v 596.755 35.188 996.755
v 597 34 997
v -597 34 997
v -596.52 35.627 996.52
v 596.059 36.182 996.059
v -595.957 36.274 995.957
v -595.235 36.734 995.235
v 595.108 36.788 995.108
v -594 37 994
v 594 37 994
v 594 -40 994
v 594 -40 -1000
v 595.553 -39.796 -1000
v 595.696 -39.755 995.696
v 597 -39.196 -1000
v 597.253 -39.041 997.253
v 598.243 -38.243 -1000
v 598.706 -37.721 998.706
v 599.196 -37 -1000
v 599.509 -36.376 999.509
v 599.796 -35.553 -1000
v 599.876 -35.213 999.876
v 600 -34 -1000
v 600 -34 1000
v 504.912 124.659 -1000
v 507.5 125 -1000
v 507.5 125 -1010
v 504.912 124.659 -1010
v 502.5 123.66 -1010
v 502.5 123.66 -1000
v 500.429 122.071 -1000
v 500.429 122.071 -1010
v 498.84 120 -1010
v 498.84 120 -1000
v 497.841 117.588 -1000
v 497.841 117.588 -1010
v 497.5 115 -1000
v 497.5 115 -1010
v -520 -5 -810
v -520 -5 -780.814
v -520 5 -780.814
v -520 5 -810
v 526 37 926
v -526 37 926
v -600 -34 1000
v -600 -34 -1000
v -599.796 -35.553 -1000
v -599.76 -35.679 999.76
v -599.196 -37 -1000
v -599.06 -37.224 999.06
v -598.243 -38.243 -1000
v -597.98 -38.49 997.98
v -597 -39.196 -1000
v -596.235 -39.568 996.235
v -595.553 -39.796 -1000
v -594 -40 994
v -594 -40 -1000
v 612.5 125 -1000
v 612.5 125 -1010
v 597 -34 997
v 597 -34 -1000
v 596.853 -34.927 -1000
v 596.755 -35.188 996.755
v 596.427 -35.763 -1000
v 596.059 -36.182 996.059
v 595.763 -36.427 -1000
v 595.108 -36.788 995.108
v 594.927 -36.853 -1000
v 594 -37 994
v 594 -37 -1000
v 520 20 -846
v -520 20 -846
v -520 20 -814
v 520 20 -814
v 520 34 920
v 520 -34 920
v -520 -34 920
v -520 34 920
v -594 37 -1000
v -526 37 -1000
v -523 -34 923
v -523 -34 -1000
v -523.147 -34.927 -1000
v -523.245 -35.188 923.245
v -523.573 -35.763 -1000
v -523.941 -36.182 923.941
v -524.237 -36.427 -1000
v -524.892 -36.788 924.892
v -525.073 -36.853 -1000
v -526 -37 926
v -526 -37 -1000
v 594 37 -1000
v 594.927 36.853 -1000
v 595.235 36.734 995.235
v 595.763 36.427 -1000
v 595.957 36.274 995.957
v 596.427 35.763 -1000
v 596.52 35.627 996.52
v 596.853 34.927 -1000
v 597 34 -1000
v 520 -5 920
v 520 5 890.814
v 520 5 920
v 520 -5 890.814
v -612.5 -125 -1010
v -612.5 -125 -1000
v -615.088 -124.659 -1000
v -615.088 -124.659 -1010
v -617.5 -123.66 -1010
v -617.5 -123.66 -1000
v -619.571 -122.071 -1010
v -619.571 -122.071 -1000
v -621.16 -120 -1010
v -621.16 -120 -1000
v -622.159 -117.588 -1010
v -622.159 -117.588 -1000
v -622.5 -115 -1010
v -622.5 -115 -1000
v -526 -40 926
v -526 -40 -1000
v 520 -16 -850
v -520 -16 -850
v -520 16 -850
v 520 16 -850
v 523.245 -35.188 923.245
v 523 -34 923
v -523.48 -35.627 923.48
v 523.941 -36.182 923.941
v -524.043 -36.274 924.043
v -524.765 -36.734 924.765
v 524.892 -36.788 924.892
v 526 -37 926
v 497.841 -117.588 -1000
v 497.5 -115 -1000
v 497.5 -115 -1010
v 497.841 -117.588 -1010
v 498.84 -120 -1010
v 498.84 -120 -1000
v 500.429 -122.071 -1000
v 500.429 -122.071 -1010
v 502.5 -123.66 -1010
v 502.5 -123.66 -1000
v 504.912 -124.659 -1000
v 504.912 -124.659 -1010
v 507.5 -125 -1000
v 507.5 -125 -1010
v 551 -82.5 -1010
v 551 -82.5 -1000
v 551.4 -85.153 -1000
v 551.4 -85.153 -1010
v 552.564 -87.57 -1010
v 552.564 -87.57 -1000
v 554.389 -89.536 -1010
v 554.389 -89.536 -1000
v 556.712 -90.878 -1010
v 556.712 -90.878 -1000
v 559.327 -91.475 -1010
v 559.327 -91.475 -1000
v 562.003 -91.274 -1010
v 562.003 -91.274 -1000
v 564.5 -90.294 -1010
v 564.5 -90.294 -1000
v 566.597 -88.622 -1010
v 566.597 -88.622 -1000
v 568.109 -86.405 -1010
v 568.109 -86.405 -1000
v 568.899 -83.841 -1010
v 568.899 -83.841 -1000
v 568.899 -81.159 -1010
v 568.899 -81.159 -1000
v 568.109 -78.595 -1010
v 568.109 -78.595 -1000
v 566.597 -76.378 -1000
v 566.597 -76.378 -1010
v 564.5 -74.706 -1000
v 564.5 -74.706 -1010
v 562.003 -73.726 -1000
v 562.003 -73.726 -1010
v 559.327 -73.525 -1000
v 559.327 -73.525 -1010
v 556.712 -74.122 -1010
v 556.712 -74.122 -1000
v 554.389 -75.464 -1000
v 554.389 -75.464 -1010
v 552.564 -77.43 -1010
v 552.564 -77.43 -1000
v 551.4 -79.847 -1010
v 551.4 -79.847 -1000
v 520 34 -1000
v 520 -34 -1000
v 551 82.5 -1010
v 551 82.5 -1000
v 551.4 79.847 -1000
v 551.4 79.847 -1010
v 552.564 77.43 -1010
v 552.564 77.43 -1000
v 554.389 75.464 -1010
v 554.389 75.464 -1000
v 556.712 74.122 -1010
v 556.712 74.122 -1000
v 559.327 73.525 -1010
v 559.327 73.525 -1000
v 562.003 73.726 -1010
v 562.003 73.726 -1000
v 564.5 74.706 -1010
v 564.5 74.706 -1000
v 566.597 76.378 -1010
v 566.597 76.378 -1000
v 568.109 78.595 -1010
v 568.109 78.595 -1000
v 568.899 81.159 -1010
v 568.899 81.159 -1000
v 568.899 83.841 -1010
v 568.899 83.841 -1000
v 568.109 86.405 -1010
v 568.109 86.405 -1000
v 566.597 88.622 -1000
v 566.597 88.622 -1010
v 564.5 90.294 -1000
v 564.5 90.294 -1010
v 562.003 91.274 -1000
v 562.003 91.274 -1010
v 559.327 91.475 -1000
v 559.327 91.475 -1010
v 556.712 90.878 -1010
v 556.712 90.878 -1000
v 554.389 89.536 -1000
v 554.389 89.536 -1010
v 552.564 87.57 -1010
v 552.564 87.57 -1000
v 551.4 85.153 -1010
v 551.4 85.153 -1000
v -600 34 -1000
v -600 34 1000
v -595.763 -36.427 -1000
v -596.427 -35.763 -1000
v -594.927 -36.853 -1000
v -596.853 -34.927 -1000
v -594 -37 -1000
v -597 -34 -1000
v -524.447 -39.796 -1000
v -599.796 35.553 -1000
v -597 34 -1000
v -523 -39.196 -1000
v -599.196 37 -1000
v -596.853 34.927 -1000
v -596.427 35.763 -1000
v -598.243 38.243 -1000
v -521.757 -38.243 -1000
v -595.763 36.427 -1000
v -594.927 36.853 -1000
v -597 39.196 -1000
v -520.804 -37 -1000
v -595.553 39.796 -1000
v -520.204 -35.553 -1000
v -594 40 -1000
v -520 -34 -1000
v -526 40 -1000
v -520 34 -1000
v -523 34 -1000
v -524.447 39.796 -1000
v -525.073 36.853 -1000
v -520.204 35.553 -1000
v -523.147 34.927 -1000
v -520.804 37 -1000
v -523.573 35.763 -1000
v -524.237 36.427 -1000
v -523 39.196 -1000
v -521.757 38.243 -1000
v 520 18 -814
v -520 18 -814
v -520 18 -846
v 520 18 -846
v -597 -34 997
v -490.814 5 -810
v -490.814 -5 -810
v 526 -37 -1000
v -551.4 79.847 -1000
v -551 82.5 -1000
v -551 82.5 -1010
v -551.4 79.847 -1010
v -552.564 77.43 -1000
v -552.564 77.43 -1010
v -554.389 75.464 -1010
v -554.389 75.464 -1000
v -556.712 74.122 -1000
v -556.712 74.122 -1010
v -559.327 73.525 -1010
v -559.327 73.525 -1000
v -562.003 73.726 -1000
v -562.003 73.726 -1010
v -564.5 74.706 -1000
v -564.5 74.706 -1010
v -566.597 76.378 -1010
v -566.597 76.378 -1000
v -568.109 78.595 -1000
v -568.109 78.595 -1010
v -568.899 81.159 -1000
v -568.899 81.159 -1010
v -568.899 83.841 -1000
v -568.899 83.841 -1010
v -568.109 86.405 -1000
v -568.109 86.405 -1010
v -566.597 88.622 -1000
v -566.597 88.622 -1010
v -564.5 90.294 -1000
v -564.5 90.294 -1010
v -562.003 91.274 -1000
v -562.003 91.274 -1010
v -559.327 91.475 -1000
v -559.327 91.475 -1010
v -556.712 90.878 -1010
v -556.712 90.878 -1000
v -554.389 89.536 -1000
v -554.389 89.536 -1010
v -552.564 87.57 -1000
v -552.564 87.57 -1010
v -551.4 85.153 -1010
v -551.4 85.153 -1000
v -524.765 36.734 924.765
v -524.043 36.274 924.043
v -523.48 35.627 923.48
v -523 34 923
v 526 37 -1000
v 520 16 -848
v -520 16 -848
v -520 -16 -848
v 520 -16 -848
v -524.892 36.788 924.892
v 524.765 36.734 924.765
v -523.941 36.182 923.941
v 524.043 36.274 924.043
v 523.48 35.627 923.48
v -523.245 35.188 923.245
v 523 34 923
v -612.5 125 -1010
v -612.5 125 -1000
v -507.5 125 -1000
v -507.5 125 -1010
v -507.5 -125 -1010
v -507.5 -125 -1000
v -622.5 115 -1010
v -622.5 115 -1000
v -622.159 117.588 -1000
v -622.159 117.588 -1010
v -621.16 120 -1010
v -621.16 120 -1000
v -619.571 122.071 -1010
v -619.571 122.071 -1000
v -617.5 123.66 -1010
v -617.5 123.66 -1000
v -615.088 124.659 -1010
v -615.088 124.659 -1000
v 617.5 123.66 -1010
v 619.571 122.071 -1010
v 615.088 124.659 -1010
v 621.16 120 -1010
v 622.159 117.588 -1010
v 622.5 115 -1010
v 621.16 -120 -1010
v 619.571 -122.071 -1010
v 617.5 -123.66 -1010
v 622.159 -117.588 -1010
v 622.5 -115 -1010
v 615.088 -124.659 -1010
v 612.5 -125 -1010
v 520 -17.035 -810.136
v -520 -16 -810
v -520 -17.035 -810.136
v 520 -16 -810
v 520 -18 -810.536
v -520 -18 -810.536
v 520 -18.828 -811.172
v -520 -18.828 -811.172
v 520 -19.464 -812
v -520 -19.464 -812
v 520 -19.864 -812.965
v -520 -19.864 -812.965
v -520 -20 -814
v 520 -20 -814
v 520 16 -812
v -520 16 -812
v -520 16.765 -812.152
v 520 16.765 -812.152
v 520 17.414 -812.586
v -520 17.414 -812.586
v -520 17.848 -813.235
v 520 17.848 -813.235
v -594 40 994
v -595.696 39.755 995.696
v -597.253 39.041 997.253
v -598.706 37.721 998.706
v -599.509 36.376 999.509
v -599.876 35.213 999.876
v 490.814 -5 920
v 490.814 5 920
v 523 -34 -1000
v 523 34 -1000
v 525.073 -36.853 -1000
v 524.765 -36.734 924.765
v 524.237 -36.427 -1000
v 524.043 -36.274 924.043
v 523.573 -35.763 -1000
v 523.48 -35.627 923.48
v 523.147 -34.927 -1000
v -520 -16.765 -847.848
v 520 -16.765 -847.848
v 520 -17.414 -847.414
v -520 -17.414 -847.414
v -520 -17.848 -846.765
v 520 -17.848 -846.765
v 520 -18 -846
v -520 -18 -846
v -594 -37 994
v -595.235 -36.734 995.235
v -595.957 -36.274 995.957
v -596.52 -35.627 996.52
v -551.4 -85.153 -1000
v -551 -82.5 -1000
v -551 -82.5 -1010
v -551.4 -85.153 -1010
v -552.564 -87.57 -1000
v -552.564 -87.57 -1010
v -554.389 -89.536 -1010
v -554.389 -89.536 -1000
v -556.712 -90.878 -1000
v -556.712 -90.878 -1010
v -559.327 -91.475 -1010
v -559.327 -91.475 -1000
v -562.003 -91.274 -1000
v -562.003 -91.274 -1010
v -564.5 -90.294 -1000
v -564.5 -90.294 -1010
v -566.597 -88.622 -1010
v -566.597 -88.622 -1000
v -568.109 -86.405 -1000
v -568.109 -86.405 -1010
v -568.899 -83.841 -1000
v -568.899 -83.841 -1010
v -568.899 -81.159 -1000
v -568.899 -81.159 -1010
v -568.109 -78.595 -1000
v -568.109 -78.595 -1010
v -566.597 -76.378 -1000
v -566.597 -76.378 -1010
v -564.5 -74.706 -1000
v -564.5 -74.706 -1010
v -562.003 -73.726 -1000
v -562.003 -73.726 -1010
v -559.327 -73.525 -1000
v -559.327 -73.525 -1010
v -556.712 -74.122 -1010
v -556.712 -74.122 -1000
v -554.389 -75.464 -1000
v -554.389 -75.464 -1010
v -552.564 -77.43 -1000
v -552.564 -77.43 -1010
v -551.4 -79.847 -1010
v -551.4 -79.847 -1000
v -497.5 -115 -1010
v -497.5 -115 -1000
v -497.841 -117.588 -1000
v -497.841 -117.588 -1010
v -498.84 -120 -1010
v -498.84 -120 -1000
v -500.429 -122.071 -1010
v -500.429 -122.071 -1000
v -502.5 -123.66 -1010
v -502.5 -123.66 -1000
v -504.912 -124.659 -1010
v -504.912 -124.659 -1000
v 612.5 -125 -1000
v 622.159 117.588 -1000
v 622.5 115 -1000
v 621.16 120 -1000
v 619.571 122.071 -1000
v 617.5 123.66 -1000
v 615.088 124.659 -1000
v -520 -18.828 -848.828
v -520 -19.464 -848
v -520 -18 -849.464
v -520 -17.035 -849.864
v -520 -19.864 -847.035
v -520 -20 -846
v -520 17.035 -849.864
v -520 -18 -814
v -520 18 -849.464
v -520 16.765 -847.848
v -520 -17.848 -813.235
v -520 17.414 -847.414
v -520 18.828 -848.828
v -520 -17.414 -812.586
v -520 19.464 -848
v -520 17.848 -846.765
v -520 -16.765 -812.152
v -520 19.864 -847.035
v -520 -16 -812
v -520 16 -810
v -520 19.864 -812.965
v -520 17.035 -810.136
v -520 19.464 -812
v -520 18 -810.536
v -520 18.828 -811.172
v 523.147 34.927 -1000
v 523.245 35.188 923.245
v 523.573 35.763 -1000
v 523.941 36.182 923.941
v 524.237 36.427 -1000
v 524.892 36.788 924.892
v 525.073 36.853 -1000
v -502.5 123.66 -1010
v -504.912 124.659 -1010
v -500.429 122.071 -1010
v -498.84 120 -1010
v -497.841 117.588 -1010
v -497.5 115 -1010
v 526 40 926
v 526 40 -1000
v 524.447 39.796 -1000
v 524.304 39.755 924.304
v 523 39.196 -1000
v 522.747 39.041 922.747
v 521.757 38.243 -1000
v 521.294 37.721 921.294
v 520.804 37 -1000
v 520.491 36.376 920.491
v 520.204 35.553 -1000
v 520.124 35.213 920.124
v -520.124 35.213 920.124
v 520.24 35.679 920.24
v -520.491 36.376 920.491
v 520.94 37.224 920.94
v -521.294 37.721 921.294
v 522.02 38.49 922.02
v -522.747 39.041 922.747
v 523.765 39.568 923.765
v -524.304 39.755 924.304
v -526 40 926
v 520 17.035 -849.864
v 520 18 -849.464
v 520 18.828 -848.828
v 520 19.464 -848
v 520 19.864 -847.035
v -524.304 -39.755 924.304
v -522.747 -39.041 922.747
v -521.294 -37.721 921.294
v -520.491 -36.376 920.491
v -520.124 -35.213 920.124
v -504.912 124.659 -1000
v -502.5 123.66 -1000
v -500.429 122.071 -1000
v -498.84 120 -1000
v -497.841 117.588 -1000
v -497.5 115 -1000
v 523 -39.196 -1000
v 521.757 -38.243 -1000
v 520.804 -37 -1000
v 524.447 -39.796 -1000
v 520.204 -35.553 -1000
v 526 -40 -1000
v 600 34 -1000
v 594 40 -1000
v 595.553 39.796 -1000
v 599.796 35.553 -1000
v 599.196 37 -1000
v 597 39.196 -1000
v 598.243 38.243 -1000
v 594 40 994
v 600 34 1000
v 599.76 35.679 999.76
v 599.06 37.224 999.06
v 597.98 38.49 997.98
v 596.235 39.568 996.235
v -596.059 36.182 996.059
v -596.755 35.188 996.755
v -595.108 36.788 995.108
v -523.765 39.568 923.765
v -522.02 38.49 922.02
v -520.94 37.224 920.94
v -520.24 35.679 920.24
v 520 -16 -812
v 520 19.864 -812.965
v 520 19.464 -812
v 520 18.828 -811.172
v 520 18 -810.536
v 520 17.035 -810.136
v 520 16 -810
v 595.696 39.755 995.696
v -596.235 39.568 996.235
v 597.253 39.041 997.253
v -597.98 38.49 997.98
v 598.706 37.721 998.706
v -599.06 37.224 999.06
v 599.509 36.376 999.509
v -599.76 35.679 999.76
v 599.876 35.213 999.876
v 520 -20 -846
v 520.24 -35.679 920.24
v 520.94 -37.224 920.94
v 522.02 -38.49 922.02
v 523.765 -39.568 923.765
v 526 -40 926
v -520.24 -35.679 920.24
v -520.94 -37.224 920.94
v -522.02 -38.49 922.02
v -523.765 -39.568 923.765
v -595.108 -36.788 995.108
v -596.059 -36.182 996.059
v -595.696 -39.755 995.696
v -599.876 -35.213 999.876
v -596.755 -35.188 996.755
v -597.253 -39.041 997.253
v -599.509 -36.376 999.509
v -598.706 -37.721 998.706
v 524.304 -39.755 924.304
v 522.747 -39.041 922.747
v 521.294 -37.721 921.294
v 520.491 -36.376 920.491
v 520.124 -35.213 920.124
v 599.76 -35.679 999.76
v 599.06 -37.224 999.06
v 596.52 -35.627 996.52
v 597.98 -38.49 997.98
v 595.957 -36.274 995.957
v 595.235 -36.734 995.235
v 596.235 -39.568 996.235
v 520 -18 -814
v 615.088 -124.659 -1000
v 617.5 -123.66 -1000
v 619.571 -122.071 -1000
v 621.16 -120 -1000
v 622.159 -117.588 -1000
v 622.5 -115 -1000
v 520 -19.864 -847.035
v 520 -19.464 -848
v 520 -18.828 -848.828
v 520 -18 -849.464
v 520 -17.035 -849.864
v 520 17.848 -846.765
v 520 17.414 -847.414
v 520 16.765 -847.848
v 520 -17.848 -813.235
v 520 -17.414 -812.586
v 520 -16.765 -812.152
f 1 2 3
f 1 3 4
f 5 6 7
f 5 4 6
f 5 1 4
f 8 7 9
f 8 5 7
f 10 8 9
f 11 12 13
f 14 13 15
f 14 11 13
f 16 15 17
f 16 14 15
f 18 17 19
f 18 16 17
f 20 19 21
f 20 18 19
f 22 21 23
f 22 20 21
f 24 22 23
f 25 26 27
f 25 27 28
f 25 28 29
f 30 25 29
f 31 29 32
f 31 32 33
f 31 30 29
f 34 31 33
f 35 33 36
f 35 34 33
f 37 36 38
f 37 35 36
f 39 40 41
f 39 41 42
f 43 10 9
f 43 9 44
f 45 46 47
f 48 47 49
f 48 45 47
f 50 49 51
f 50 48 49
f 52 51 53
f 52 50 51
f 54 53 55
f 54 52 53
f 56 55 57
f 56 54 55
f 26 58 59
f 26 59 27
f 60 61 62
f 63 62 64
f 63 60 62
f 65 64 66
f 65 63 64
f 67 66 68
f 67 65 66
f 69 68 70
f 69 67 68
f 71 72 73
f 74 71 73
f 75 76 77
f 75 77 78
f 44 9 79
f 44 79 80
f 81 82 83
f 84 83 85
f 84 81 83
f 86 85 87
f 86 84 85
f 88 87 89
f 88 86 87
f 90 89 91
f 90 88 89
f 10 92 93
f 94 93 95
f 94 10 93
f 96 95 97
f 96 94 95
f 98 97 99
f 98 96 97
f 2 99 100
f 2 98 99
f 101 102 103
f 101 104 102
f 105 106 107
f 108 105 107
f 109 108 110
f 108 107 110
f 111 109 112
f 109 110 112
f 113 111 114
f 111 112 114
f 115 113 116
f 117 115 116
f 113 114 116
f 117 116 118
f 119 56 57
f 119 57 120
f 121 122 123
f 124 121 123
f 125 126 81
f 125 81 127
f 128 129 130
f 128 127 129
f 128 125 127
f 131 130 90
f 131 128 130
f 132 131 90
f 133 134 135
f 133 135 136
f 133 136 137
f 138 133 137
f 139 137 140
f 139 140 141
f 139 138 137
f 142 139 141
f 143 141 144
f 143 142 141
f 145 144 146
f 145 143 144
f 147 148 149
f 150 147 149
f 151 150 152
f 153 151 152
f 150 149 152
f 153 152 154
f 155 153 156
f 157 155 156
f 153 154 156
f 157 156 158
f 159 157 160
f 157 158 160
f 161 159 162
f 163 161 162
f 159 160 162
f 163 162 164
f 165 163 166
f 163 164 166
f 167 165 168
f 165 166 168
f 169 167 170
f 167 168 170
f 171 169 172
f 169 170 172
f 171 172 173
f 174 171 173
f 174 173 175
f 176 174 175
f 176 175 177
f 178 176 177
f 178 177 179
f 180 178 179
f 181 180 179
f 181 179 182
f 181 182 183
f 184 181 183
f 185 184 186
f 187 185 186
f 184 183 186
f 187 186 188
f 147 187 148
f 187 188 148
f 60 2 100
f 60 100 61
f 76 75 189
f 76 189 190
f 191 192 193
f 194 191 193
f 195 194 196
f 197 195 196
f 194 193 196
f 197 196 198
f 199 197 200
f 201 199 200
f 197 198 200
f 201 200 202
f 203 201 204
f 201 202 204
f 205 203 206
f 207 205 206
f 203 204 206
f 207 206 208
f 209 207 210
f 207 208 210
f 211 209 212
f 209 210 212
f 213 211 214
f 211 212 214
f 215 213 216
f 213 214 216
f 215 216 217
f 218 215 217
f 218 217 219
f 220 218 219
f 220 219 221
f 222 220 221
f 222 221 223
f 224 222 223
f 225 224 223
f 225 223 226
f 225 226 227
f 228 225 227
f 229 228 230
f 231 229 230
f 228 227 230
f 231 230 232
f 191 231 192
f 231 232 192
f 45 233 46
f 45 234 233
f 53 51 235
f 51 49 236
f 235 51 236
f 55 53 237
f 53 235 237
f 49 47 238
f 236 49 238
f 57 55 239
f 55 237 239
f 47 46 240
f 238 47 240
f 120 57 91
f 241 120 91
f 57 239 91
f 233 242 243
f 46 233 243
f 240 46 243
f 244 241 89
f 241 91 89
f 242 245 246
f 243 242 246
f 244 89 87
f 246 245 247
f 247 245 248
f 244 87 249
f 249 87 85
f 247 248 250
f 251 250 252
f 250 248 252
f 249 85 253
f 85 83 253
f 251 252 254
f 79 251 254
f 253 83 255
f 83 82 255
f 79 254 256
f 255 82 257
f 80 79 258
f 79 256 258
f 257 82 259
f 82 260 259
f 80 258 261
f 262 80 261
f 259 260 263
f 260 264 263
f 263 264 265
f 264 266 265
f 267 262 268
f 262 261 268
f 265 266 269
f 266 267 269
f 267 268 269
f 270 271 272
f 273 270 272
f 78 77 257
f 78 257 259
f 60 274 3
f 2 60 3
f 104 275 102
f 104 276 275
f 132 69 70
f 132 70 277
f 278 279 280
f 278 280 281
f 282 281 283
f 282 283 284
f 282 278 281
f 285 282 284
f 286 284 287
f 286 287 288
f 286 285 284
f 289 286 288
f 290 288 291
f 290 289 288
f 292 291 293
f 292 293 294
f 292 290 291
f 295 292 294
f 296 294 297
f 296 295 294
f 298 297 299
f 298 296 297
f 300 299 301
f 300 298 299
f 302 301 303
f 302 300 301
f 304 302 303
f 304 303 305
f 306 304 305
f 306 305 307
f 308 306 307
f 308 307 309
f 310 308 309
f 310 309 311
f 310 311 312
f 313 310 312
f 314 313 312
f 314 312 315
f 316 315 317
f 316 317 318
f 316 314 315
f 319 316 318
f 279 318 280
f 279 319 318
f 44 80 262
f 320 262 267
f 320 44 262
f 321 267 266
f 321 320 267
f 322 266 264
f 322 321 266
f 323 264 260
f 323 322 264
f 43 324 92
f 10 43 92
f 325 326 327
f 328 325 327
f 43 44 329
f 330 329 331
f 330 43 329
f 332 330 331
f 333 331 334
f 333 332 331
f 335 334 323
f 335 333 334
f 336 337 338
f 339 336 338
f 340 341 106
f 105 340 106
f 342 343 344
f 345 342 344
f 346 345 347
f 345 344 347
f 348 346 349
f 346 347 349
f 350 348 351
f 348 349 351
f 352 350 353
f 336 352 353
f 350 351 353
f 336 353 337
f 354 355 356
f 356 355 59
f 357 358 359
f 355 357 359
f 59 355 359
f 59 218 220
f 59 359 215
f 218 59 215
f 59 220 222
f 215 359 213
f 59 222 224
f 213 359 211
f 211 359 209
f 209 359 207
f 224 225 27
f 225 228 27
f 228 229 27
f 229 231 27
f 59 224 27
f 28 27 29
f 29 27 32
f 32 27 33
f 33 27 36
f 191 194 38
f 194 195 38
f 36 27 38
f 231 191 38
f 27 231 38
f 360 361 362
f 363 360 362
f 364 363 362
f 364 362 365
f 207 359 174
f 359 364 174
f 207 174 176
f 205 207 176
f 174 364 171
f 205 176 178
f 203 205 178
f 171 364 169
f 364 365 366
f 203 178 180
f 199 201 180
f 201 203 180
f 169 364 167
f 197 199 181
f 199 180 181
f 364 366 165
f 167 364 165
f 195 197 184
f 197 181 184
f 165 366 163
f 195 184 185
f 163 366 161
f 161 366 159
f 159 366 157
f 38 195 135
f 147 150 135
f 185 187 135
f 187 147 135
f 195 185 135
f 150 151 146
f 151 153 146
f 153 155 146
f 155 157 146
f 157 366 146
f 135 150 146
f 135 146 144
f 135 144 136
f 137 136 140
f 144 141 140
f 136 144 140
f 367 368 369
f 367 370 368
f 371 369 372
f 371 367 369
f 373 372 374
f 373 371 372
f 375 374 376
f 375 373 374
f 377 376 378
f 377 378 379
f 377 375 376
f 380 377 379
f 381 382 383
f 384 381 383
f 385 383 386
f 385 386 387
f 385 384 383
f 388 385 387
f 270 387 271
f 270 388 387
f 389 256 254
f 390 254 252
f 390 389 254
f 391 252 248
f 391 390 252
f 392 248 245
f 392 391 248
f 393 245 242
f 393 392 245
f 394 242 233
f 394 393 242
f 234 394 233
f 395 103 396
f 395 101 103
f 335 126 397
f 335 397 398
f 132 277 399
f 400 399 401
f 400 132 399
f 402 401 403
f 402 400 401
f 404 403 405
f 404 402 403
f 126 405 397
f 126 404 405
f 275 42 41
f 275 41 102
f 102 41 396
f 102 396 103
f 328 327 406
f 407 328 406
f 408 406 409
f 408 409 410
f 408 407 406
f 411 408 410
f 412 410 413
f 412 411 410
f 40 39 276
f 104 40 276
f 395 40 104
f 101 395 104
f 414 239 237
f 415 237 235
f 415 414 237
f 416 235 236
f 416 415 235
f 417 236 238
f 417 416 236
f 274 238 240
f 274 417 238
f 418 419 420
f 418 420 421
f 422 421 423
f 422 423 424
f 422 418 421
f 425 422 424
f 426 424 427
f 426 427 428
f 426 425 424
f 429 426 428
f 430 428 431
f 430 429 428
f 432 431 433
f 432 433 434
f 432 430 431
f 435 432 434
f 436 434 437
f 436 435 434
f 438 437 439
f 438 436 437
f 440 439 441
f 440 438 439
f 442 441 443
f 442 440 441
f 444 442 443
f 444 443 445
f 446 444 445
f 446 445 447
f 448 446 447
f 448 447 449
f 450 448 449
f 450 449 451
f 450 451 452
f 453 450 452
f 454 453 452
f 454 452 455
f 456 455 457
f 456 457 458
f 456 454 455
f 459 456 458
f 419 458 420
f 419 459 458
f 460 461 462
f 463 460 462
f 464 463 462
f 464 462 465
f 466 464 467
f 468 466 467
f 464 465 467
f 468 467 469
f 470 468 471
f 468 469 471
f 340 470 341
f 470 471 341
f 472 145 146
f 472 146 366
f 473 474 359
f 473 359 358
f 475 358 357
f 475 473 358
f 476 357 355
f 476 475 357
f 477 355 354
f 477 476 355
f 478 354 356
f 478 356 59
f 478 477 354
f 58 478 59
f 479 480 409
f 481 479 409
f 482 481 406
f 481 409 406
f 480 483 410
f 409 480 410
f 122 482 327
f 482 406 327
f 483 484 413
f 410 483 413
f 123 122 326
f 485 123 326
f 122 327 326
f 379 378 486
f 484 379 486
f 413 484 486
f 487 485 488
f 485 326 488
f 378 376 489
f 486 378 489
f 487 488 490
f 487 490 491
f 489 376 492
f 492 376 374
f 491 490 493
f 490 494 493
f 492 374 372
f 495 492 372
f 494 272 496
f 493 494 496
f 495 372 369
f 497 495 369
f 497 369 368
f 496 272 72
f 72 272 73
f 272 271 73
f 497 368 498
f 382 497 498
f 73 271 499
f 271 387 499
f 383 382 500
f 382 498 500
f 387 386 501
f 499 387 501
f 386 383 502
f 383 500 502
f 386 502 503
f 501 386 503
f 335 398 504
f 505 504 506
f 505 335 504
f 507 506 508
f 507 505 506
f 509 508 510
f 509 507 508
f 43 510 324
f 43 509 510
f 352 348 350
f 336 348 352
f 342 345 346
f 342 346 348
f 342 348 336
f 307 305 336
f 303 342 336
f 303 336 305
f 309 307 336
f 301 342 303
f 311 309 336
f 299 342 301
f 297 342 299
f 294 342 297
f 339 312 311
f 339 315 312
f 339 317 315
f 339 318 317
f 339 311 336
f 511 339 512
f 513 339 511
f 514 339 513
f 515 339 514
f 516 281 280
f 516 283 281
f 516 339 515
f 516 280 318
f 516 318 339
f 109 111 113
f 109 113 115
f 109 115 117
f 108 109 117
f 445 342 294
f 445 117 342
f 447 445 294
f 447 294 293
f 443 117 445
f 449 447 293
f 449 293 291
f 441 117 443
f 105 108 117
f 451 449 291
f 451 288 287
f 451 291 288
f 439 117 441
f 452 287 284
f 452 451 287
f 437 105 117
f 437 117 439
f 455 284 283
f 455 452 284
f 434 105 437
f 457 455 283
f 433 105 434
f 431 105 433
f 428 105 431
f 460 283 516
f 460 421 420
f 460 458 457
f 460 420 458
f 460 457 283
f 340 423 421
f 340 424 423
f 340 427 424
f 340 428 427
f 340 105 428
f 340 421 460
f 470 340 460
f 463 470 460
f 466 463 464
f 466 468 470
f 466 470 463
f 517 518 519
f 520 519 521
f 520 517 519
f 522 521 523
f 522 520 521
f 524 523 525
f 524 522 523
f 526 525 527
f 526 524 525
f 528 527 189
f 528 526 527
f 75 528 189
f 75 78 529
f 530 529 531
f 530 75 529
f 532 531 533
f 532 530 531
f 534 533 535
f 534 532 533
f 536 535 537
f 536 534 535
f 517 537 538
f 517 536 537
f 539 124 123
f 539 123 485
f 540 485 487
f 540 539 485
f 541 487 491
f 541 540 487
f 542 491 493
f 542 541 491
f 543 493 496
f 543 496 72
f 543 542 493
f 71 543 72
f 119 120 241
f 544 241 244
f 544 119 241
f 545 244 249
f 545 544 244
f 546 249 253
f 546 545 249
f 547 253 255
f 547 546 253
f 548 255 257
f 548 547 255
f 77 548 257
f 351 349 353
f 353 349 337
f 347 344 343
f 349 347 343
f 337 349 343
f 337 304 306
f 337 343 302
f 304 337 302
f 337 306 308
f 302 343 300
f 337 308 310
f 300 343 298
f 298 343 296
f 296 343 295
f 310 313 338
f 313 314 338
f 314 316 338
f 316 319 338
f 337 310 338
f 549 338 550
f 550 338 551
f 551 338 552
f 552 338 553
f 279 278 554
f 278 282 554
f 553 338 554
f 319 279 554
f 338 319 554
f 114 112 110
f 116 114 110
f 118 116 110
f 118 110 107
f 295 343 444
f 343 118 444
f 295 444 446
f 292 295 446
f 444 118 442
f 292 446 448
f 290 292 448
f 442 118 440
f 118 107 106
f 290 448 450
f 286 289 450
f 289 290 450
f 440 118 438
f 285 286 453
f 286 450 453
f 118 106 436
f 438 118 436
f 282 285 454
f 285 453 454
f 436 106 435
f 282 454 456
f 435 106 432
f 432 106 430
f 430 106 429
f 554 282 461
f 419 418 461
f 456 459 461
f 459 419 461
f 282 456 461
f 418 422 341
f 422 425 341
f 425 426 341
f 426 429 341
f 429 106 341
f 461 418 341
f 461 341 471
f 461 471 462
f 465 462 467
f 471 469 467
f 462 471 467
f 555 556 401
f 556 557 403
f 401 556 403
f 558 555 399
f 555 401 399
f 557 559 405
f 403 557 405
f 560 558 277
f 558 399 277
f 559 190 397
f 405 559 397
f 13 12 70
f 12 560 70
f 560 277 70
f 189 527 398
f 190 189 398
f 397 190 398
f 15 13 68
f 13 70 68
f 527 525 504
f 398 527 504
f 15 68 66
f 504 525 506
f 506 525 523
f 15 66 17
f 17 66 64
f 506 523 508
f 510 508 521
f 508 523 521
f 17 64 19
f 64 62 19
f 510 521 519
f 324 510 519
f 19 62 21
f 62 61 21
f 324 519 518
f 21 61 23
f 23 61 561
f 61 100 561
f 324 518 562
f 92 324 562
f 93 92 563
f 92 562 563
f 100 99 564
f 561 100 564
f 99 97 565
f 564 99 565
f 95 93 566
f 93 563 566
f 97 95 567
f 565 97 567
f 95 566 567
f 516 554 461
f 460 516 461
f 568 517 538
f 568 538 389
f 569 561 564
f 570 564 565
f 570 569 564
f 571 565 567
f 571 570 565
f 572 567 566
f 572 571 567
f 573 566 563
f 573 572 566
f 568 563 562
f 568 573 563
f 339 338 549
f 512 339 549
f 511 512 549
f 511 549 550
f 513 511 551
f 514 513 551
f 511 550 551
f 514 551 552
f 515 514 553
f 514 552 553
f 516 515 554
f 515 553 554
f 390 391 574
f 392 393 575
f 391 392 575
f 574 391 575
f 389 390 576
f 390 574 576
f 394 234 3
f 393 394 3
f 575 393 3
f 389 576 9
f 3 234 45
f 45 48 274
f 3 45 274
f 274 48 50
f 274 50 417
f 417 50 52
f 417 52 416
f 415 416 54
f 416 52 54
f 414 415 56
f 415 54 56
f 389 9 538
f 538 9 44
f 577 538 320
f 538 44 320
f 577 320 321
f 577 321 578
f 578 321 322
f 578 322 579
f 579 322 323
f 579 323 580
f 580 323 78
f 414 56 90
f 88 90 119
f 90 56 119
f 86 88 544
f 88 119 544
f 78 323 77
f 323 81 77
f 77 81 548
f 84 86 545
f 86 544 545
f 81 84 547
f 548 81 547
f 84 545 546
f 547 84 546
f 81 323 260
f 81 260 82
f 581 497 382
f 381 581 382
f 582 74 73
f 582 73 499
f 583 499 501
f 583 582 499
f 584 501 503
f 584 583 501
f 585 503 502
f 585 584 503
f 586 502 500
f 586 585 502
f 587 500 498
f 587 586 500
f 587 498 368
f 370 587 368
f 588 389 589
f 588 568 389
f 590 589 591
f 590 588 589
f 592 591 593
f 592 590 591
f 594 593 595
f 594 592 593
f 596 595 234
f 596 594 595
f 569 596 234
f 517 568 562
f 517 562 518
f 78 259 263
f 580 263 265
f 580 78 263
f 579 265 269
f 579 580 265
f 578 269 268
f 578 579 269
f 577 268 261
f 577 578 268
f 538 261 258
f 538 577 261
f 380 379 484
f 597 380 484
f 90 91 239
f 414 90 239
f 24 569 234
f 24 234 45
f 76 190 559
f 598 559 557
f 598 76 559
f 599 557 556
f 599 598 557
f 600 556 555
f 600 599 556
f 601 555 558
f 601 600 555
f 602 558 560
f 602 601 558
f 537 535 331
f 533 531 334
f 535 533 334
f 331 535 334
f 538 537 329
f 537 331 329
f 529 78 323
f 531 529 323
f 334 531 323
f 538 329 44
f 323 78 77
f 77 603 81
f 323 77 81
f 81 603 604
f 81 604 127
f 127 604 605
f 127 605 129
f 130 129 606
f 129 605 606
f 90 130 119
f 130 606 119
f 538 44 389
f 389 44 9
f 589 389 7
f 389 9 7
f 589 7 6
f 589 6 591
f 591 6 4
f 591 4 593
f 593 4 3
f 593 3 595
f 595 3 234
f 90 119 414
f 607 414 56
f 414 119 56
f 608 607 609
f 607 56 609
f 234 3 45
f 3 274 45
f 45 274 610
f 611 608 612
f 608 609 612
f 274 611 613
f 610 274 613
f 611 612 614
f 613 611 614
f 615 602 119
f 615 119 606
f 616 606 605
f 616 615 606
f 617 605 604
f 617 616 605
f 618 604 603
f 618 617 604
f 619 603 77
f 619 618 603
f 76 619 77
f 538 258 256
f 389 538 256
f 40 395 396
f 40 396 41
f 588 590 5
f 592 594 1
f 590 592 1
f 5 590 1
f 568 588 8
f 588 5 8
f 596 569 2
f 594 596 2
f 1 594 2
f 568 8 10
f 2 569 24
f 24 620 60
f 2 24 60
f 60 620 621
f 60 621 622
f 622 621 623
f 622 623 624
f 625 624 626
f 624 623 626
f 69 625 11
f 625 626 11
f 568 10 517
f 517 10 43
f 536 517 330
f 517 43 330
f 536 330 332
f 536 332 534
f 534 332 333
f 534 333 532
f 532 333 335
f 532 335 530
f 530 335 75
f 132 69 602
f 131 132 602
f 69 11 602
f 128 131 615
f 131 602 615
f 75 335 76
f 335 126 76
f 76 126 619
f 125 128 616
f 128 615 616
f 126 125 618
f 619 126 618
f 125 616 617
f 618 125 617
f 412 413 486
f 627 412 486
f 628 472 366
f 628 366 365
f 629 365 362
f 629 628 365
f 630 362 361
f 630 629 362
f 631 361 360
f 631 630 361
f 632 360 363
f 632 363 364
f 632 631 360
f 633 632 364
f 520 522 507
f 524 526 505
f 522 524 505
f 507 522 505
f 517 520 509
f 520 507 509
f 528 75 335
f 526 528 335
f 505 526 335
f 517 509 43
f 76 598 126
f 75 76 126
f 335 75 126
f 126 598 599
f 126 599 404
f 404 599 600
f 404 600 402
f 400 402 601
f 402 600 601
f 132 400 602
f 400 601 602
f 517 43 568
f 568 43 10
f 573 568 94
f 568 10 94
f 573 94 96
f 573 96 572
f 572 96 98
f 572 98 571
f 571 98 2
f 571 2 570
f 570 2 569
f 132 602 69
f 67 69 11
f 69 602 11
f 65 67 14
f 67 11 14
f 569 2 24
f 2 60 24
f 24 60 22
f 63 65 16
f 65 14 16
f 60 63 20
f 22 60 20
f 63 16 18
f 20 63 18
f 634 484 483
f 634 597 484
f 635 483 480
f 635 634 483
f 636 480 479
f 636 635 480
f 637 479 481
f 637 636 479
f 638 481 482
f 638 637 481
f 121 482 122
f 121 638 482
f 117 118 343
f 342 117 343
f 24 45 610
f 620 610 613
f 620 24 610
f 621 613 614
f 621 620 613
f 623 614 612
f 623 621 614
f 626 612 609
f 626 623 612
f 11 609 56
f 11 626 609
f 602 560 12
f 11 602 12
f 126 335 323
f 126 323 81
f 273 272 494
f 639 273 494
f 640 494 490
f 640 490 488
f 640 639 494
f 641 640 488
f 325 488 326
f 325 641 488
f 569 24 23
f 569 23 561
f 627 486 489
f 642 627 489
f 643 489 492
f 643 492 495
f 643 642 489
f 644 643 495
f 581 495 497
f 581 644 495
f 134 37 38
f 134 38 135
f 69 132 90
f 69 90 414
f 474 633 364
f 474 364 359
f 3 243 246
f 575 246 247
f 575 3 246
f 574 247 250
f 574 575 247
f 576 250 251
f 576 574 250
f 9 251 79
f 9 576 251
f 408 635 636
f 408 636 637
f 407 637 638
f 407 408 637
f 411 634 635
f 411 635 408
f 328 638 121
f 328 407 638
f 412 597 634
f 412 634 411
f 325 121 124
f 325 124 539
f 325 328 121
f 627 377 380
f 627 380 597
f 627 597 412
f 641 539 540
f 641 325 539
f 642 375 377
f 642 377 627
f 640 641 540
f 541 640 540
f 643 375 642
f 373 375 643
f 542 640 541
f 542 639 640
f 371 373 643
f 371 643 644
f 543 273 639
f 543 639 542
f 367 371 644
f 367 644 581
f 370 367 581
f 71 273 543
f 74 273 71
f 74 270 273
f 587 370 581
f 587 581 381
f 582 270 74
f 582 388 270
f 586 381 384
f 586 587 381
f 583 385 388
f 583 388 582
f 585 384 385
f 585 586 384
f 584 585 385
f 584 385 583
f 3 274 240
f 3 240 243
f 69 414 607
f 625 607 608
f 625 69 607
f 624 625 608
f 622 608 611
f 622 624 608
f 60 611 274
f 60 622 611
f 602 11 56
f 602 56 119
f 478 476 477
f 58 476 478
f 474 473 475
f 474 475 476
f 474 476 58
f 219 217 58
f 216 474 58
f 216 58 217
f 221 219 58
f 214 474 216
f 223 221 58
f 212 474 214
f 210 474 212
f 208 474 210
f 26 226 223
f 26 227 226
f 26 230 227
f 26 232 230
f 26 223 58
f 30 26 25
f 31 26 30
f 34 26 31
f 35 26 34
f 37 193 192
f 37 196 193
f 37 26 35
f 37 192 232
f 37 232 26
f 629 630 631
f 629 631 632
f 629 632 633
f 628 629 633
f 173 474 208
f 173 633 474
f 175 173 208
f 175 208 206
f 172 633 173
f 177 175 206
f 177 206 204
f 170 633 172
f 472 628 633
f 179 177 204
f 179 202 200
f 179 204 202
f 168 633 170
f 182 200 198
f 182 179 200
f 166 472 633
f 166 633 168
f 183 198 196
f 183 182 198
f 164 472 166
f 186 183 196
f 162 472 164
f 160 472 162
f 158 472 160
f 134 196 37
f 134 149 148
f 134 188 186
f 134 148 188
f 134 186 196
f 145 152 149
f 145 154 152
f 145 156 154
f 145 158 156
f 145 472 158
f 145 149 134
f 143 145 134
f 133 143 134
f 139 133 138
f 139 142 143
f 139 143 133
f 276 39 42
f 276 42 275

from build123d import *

# Parameters (mm, degrees)
F1_DEPTH  = 1000
F3_DEPTH  = 520
F5_DEPTH  = 80.001
F7_DEPTH  = 600
F9_DEPTH  = 80.001
F11_DEPTH = 5
F12_R     = 9
F13_DEPTH = 10


with BuildPart() as f1:
    # F0 (on Top) → F1 (new body, symmetric)
    with BuildSketch(Plane.XY):
        with BuildLine():
            ThreePointArc((-600, -34), (-598.2426406871, -38.2426406871), (-594, -40))
            Line((-594, -40), (-526, -40))
            ThreePointArc((-526, -40), (-521.7573593129, -38.2426406871), (-520, -34))
            Line((-520, -34), (-520, 34))
            ThreePointArc((-520, 34), (-521.7573593129, 38.2426406871), (-526, 40))
            Line((-526, 40), (-594, 40))
            ThreePointArc((-594, 40), (-598.2426406871, 38.2426406871), (-600, 34))
            Line((-600, 34), (-600, -34))
        make_face()
        with BuildLine():
            ThreePointArc((-597, 34), (-596.1213203436, 36.1213203436), (-594, 37))
            Line((-594, 37), (-526, 37))
            ThreePointArc((-526, 37), (-523.8786796564, 36.1213203436), (-523, 34))
            Line((-523, 34), (-523, -34))
            ThreePointArc((-523, -34), (-523.8786796564, -36.1213203436), (-526, -37))
            Line((-526, -37), (-594, -37))
            ThreePointArc((-594, -37), (-596.1213203436, -36.1213203436), (-597, -34))
            Line((-597, -34), (-597, 34))
        make_face(mode=Mode.SUBTRACT)
    extrude(amount=F1_DEPTH, both=True)


with BuildPart() as f1b:
    # F0 (on Top) → F1, piece 2 (new body, symmetric)
    with BuildSketch(Plane.XY):
        with BuildLine():
            ThreePointArc((594, -40), (598.2426406871, -38.2426406871), (600, -34))
            Line((600, -34), (600, 34))
            ThreePointArc((600, 34), (598.2426406871, 38.2426406871), (594, 40))
            Line((594, 40), (526, 40))
            ThreePointArc((526, 40), (521.7573593129, 38.2426406871), (520, 34))
            Line((520, 34), (520, -34))
            ThreePointArc((520, -34), (521.7573593129, -38.2426406871), (526, -40))
            Line((526, -40), (594, -40))
        make_face()
        with BuildLine():
            Line((526, 37), (594, 37))
            ThreePointArc((594, 37), (596.1213203436, 36.1213203436), (597, 34))
            Line((597, 34), (597, -34))
            ThreePointArc((597, -34), (596.1213203436, -36.1213203436), (594, -37))
            Line((594, -37), (526, -37))
            ThreePointArc((526, -37), (523.8786796564, -36.1213203436), (523, -34))
            Line((523, -34), (523, 34))
            ThreePointArc((523, 34), (523.8786796564, 36.1213203436), (526, 37))
        make_face(mode=Mode.SUBTRACT)
    extrude(amount=F1_DEPTH, both=True)


with BuildPart() as f3:
    # F2 (on Right) → F3 (new body, symmetric)
    with BuildSketch(Plane.YZ):
        with BuildLine():
            ThreePointArc((-20, -846), (-18.8284271247, -848.8284271247), (-16, -850))
            Line((-16, -850), (16, -850))
            ThreePointArc((16, -850), (18.8284271247, -848.8284271247), (20, -846))
            Line((20, -846), (20, -814))
            ThreePointArc((20, -814), (18.8284271247, -811.1715728753), (16, -810))
            Line((16, -810), (-16, -810))
            ThreePointArc((-16, -810), (-18.8284271247, -811.1715728753), (-20, -814))
            Line((-20, -814), (-20, -846))
        make_face()
        with BuildLine():
            ThreePointArc((-18, -814), (-17.4142135624, -812.5857864376), (-16, -812))
            Line((-16, -812), (16, -812))
            ThreePointArc((16, -812), (17.4142135624, -812.5857864376), (18, -814))
            Line((18, -814), (18, -846))
            ThreePointArc((18, -846), (17.4142135624, -847.4142135624), (16, -848))
            Line((16, -848), (-16, -848))
            ThreePointArc((-16, -848), (-17.4142135624, -847.4142135624), (-18, -846))
            Line((-18, -846), (-18, -814))
        make_face(mode=Mode.SUBTRACT)
    extrude(amount=F3_DEPTH, both=True)


with BuildPart() as f5_tool:
    # F4 (on face) → F5 (new body, through all)
    with BuildSketch(Plane.XZ.offset(40)):
        Polygon((-520, 1000), (-600, 1000), (-520, 920), align=None)
        Polygon((520, 920), (600, 1000), (520, 1000), align=None)
    extrude(amount=-F5_DEPTH)


with BuildPart() as f1_1:
    add(f1.part)

    # F5: cut by f5_tool
    add(f5_tool.part, mode=Mode.SUBTRACT)


with BuildPart() as f1b_1:
    add(f1b.part)

    # F5: cut by f5_tool
    add(f5_tool.part, mode=Mode.SUBTRACT)


with BuildPart() as f7:
    # F6 (on Right) → F7 (new body, symmetric)
    with BuildSketch(Plane.YZ):
        with BuildLine():
            ThreePointArc((40, 994), (38.2426406871, 998.2426406871), (34, 1000))
            Line((34, 1000), (-34, 1000))
            ThreePointArc((-34, 1000), (-38.2426406871, 998.2426406871), (-40, 994))
            Line((-40, 994), (-40, 926))
            ThreePointArc((-40, 926), (-38.2426406871, 921.7573593129), (-34, 920))
            Line((-34, 920), (34, 920))
            ThreePointArc((34, 920), (38.2426406871, 921.7573593129), (40, 926))
            Line((40, 926), (40, 994))
        make_face()
        with BuildLine():
            ThreePointArc((34, 997), (36.1213203436, 996.1213203436), (37, 994))
            Line((37, 994), (37, 926))
            ThreePointArc((37, 926), (36.1213203436, 923.8786796564), (34, 923))
            Line((34, 923), (-34, 923))
            ThreePointArc((-34, 923), (-36.1213203436, 923.8786796564), (-37, 926))
            Line((-37, 926), (-37, 994))
            ThreePointArc((-37, 994), (-36.1213203436, 996.1213203436), (-34, 997))
            Line((-34, 997), (34, 997))
        make_face(mode=Mode.SUBTRACT)
    extrude(amount=F7_DEPTH, both=True)

    # F8 (on face) → F9 (cut, through all)
    with BuildSketch(Plane.XZ.offset(40)):
        Polygon((-600, 1000), (-600, 920), (-520, 920), align=None)
        Polygon((600, 1000), (520, 920), (600, 920), align=None)
    extrude(amount=-F9_DEPTH, mode=Mode.SUBTRACT)


with BuildPart() as f11:
    # F10 (on Front) → F11 (new body, symmetric)
    with BuildSketch(Plane.XZ):
        Polygon((520, 920), (490.8143913183, 920), (-520, -780.8143913183), (-520, -810), (-490.8143913183, -810), (520, 890.8143913183), align=None)
    extrude(amount=F11_DEPTH, both=True)


with BuildPart() as f13:
    # F12 (on face) → F13 (new body)
    with BuildSketch(Plane(origin=(0, 0, -1000), x_dir=(1, 0, 0), z_dir=(0, 0, -1))):
        with BuildLine():
            Line((-612.5, -125), (-507.5, -125))
            ThreePointArc((-507.5, -125), (-500.4289321881, -122.0710678119), (-497.5, -115))
            Line((-497.5, -115), (-497.5, 115))
            ThreePointArc((-497.5, 115), (-500.4289321881, 122.0710678119), (-507.5, 125))
            Line((-507.5, 125), (-612.5, 125))
            ThreePointArc((-612.5, 125), (-619.5710678119, 122.0710678119), (-622.5, 115))
            Line((-622.5, 115), (-622.5, -115))
            ThreePointArc((-622.5, -115), (-619.5710678119, -122.0710678119), (-612.5, -125))
        make_face()
        with Locations((-560, -82.5)):
            Circle(F12_R, mode=Mode.SUBTRACT)
        with Locations((-560, 82.5)):
            Circle(F12_R, mode=Mode.SUBTRACT)
    extrude(amount=F13_DEPTH)


with BuildPart() as f14_1:
    # F14: instance of F13
    add(f13.part.mirror(Plane.YZ))


solid = Compound([f3.part, f1_1.part, f1b_1.part, f7.part, f11.part, f13.part, f14_1.part])
